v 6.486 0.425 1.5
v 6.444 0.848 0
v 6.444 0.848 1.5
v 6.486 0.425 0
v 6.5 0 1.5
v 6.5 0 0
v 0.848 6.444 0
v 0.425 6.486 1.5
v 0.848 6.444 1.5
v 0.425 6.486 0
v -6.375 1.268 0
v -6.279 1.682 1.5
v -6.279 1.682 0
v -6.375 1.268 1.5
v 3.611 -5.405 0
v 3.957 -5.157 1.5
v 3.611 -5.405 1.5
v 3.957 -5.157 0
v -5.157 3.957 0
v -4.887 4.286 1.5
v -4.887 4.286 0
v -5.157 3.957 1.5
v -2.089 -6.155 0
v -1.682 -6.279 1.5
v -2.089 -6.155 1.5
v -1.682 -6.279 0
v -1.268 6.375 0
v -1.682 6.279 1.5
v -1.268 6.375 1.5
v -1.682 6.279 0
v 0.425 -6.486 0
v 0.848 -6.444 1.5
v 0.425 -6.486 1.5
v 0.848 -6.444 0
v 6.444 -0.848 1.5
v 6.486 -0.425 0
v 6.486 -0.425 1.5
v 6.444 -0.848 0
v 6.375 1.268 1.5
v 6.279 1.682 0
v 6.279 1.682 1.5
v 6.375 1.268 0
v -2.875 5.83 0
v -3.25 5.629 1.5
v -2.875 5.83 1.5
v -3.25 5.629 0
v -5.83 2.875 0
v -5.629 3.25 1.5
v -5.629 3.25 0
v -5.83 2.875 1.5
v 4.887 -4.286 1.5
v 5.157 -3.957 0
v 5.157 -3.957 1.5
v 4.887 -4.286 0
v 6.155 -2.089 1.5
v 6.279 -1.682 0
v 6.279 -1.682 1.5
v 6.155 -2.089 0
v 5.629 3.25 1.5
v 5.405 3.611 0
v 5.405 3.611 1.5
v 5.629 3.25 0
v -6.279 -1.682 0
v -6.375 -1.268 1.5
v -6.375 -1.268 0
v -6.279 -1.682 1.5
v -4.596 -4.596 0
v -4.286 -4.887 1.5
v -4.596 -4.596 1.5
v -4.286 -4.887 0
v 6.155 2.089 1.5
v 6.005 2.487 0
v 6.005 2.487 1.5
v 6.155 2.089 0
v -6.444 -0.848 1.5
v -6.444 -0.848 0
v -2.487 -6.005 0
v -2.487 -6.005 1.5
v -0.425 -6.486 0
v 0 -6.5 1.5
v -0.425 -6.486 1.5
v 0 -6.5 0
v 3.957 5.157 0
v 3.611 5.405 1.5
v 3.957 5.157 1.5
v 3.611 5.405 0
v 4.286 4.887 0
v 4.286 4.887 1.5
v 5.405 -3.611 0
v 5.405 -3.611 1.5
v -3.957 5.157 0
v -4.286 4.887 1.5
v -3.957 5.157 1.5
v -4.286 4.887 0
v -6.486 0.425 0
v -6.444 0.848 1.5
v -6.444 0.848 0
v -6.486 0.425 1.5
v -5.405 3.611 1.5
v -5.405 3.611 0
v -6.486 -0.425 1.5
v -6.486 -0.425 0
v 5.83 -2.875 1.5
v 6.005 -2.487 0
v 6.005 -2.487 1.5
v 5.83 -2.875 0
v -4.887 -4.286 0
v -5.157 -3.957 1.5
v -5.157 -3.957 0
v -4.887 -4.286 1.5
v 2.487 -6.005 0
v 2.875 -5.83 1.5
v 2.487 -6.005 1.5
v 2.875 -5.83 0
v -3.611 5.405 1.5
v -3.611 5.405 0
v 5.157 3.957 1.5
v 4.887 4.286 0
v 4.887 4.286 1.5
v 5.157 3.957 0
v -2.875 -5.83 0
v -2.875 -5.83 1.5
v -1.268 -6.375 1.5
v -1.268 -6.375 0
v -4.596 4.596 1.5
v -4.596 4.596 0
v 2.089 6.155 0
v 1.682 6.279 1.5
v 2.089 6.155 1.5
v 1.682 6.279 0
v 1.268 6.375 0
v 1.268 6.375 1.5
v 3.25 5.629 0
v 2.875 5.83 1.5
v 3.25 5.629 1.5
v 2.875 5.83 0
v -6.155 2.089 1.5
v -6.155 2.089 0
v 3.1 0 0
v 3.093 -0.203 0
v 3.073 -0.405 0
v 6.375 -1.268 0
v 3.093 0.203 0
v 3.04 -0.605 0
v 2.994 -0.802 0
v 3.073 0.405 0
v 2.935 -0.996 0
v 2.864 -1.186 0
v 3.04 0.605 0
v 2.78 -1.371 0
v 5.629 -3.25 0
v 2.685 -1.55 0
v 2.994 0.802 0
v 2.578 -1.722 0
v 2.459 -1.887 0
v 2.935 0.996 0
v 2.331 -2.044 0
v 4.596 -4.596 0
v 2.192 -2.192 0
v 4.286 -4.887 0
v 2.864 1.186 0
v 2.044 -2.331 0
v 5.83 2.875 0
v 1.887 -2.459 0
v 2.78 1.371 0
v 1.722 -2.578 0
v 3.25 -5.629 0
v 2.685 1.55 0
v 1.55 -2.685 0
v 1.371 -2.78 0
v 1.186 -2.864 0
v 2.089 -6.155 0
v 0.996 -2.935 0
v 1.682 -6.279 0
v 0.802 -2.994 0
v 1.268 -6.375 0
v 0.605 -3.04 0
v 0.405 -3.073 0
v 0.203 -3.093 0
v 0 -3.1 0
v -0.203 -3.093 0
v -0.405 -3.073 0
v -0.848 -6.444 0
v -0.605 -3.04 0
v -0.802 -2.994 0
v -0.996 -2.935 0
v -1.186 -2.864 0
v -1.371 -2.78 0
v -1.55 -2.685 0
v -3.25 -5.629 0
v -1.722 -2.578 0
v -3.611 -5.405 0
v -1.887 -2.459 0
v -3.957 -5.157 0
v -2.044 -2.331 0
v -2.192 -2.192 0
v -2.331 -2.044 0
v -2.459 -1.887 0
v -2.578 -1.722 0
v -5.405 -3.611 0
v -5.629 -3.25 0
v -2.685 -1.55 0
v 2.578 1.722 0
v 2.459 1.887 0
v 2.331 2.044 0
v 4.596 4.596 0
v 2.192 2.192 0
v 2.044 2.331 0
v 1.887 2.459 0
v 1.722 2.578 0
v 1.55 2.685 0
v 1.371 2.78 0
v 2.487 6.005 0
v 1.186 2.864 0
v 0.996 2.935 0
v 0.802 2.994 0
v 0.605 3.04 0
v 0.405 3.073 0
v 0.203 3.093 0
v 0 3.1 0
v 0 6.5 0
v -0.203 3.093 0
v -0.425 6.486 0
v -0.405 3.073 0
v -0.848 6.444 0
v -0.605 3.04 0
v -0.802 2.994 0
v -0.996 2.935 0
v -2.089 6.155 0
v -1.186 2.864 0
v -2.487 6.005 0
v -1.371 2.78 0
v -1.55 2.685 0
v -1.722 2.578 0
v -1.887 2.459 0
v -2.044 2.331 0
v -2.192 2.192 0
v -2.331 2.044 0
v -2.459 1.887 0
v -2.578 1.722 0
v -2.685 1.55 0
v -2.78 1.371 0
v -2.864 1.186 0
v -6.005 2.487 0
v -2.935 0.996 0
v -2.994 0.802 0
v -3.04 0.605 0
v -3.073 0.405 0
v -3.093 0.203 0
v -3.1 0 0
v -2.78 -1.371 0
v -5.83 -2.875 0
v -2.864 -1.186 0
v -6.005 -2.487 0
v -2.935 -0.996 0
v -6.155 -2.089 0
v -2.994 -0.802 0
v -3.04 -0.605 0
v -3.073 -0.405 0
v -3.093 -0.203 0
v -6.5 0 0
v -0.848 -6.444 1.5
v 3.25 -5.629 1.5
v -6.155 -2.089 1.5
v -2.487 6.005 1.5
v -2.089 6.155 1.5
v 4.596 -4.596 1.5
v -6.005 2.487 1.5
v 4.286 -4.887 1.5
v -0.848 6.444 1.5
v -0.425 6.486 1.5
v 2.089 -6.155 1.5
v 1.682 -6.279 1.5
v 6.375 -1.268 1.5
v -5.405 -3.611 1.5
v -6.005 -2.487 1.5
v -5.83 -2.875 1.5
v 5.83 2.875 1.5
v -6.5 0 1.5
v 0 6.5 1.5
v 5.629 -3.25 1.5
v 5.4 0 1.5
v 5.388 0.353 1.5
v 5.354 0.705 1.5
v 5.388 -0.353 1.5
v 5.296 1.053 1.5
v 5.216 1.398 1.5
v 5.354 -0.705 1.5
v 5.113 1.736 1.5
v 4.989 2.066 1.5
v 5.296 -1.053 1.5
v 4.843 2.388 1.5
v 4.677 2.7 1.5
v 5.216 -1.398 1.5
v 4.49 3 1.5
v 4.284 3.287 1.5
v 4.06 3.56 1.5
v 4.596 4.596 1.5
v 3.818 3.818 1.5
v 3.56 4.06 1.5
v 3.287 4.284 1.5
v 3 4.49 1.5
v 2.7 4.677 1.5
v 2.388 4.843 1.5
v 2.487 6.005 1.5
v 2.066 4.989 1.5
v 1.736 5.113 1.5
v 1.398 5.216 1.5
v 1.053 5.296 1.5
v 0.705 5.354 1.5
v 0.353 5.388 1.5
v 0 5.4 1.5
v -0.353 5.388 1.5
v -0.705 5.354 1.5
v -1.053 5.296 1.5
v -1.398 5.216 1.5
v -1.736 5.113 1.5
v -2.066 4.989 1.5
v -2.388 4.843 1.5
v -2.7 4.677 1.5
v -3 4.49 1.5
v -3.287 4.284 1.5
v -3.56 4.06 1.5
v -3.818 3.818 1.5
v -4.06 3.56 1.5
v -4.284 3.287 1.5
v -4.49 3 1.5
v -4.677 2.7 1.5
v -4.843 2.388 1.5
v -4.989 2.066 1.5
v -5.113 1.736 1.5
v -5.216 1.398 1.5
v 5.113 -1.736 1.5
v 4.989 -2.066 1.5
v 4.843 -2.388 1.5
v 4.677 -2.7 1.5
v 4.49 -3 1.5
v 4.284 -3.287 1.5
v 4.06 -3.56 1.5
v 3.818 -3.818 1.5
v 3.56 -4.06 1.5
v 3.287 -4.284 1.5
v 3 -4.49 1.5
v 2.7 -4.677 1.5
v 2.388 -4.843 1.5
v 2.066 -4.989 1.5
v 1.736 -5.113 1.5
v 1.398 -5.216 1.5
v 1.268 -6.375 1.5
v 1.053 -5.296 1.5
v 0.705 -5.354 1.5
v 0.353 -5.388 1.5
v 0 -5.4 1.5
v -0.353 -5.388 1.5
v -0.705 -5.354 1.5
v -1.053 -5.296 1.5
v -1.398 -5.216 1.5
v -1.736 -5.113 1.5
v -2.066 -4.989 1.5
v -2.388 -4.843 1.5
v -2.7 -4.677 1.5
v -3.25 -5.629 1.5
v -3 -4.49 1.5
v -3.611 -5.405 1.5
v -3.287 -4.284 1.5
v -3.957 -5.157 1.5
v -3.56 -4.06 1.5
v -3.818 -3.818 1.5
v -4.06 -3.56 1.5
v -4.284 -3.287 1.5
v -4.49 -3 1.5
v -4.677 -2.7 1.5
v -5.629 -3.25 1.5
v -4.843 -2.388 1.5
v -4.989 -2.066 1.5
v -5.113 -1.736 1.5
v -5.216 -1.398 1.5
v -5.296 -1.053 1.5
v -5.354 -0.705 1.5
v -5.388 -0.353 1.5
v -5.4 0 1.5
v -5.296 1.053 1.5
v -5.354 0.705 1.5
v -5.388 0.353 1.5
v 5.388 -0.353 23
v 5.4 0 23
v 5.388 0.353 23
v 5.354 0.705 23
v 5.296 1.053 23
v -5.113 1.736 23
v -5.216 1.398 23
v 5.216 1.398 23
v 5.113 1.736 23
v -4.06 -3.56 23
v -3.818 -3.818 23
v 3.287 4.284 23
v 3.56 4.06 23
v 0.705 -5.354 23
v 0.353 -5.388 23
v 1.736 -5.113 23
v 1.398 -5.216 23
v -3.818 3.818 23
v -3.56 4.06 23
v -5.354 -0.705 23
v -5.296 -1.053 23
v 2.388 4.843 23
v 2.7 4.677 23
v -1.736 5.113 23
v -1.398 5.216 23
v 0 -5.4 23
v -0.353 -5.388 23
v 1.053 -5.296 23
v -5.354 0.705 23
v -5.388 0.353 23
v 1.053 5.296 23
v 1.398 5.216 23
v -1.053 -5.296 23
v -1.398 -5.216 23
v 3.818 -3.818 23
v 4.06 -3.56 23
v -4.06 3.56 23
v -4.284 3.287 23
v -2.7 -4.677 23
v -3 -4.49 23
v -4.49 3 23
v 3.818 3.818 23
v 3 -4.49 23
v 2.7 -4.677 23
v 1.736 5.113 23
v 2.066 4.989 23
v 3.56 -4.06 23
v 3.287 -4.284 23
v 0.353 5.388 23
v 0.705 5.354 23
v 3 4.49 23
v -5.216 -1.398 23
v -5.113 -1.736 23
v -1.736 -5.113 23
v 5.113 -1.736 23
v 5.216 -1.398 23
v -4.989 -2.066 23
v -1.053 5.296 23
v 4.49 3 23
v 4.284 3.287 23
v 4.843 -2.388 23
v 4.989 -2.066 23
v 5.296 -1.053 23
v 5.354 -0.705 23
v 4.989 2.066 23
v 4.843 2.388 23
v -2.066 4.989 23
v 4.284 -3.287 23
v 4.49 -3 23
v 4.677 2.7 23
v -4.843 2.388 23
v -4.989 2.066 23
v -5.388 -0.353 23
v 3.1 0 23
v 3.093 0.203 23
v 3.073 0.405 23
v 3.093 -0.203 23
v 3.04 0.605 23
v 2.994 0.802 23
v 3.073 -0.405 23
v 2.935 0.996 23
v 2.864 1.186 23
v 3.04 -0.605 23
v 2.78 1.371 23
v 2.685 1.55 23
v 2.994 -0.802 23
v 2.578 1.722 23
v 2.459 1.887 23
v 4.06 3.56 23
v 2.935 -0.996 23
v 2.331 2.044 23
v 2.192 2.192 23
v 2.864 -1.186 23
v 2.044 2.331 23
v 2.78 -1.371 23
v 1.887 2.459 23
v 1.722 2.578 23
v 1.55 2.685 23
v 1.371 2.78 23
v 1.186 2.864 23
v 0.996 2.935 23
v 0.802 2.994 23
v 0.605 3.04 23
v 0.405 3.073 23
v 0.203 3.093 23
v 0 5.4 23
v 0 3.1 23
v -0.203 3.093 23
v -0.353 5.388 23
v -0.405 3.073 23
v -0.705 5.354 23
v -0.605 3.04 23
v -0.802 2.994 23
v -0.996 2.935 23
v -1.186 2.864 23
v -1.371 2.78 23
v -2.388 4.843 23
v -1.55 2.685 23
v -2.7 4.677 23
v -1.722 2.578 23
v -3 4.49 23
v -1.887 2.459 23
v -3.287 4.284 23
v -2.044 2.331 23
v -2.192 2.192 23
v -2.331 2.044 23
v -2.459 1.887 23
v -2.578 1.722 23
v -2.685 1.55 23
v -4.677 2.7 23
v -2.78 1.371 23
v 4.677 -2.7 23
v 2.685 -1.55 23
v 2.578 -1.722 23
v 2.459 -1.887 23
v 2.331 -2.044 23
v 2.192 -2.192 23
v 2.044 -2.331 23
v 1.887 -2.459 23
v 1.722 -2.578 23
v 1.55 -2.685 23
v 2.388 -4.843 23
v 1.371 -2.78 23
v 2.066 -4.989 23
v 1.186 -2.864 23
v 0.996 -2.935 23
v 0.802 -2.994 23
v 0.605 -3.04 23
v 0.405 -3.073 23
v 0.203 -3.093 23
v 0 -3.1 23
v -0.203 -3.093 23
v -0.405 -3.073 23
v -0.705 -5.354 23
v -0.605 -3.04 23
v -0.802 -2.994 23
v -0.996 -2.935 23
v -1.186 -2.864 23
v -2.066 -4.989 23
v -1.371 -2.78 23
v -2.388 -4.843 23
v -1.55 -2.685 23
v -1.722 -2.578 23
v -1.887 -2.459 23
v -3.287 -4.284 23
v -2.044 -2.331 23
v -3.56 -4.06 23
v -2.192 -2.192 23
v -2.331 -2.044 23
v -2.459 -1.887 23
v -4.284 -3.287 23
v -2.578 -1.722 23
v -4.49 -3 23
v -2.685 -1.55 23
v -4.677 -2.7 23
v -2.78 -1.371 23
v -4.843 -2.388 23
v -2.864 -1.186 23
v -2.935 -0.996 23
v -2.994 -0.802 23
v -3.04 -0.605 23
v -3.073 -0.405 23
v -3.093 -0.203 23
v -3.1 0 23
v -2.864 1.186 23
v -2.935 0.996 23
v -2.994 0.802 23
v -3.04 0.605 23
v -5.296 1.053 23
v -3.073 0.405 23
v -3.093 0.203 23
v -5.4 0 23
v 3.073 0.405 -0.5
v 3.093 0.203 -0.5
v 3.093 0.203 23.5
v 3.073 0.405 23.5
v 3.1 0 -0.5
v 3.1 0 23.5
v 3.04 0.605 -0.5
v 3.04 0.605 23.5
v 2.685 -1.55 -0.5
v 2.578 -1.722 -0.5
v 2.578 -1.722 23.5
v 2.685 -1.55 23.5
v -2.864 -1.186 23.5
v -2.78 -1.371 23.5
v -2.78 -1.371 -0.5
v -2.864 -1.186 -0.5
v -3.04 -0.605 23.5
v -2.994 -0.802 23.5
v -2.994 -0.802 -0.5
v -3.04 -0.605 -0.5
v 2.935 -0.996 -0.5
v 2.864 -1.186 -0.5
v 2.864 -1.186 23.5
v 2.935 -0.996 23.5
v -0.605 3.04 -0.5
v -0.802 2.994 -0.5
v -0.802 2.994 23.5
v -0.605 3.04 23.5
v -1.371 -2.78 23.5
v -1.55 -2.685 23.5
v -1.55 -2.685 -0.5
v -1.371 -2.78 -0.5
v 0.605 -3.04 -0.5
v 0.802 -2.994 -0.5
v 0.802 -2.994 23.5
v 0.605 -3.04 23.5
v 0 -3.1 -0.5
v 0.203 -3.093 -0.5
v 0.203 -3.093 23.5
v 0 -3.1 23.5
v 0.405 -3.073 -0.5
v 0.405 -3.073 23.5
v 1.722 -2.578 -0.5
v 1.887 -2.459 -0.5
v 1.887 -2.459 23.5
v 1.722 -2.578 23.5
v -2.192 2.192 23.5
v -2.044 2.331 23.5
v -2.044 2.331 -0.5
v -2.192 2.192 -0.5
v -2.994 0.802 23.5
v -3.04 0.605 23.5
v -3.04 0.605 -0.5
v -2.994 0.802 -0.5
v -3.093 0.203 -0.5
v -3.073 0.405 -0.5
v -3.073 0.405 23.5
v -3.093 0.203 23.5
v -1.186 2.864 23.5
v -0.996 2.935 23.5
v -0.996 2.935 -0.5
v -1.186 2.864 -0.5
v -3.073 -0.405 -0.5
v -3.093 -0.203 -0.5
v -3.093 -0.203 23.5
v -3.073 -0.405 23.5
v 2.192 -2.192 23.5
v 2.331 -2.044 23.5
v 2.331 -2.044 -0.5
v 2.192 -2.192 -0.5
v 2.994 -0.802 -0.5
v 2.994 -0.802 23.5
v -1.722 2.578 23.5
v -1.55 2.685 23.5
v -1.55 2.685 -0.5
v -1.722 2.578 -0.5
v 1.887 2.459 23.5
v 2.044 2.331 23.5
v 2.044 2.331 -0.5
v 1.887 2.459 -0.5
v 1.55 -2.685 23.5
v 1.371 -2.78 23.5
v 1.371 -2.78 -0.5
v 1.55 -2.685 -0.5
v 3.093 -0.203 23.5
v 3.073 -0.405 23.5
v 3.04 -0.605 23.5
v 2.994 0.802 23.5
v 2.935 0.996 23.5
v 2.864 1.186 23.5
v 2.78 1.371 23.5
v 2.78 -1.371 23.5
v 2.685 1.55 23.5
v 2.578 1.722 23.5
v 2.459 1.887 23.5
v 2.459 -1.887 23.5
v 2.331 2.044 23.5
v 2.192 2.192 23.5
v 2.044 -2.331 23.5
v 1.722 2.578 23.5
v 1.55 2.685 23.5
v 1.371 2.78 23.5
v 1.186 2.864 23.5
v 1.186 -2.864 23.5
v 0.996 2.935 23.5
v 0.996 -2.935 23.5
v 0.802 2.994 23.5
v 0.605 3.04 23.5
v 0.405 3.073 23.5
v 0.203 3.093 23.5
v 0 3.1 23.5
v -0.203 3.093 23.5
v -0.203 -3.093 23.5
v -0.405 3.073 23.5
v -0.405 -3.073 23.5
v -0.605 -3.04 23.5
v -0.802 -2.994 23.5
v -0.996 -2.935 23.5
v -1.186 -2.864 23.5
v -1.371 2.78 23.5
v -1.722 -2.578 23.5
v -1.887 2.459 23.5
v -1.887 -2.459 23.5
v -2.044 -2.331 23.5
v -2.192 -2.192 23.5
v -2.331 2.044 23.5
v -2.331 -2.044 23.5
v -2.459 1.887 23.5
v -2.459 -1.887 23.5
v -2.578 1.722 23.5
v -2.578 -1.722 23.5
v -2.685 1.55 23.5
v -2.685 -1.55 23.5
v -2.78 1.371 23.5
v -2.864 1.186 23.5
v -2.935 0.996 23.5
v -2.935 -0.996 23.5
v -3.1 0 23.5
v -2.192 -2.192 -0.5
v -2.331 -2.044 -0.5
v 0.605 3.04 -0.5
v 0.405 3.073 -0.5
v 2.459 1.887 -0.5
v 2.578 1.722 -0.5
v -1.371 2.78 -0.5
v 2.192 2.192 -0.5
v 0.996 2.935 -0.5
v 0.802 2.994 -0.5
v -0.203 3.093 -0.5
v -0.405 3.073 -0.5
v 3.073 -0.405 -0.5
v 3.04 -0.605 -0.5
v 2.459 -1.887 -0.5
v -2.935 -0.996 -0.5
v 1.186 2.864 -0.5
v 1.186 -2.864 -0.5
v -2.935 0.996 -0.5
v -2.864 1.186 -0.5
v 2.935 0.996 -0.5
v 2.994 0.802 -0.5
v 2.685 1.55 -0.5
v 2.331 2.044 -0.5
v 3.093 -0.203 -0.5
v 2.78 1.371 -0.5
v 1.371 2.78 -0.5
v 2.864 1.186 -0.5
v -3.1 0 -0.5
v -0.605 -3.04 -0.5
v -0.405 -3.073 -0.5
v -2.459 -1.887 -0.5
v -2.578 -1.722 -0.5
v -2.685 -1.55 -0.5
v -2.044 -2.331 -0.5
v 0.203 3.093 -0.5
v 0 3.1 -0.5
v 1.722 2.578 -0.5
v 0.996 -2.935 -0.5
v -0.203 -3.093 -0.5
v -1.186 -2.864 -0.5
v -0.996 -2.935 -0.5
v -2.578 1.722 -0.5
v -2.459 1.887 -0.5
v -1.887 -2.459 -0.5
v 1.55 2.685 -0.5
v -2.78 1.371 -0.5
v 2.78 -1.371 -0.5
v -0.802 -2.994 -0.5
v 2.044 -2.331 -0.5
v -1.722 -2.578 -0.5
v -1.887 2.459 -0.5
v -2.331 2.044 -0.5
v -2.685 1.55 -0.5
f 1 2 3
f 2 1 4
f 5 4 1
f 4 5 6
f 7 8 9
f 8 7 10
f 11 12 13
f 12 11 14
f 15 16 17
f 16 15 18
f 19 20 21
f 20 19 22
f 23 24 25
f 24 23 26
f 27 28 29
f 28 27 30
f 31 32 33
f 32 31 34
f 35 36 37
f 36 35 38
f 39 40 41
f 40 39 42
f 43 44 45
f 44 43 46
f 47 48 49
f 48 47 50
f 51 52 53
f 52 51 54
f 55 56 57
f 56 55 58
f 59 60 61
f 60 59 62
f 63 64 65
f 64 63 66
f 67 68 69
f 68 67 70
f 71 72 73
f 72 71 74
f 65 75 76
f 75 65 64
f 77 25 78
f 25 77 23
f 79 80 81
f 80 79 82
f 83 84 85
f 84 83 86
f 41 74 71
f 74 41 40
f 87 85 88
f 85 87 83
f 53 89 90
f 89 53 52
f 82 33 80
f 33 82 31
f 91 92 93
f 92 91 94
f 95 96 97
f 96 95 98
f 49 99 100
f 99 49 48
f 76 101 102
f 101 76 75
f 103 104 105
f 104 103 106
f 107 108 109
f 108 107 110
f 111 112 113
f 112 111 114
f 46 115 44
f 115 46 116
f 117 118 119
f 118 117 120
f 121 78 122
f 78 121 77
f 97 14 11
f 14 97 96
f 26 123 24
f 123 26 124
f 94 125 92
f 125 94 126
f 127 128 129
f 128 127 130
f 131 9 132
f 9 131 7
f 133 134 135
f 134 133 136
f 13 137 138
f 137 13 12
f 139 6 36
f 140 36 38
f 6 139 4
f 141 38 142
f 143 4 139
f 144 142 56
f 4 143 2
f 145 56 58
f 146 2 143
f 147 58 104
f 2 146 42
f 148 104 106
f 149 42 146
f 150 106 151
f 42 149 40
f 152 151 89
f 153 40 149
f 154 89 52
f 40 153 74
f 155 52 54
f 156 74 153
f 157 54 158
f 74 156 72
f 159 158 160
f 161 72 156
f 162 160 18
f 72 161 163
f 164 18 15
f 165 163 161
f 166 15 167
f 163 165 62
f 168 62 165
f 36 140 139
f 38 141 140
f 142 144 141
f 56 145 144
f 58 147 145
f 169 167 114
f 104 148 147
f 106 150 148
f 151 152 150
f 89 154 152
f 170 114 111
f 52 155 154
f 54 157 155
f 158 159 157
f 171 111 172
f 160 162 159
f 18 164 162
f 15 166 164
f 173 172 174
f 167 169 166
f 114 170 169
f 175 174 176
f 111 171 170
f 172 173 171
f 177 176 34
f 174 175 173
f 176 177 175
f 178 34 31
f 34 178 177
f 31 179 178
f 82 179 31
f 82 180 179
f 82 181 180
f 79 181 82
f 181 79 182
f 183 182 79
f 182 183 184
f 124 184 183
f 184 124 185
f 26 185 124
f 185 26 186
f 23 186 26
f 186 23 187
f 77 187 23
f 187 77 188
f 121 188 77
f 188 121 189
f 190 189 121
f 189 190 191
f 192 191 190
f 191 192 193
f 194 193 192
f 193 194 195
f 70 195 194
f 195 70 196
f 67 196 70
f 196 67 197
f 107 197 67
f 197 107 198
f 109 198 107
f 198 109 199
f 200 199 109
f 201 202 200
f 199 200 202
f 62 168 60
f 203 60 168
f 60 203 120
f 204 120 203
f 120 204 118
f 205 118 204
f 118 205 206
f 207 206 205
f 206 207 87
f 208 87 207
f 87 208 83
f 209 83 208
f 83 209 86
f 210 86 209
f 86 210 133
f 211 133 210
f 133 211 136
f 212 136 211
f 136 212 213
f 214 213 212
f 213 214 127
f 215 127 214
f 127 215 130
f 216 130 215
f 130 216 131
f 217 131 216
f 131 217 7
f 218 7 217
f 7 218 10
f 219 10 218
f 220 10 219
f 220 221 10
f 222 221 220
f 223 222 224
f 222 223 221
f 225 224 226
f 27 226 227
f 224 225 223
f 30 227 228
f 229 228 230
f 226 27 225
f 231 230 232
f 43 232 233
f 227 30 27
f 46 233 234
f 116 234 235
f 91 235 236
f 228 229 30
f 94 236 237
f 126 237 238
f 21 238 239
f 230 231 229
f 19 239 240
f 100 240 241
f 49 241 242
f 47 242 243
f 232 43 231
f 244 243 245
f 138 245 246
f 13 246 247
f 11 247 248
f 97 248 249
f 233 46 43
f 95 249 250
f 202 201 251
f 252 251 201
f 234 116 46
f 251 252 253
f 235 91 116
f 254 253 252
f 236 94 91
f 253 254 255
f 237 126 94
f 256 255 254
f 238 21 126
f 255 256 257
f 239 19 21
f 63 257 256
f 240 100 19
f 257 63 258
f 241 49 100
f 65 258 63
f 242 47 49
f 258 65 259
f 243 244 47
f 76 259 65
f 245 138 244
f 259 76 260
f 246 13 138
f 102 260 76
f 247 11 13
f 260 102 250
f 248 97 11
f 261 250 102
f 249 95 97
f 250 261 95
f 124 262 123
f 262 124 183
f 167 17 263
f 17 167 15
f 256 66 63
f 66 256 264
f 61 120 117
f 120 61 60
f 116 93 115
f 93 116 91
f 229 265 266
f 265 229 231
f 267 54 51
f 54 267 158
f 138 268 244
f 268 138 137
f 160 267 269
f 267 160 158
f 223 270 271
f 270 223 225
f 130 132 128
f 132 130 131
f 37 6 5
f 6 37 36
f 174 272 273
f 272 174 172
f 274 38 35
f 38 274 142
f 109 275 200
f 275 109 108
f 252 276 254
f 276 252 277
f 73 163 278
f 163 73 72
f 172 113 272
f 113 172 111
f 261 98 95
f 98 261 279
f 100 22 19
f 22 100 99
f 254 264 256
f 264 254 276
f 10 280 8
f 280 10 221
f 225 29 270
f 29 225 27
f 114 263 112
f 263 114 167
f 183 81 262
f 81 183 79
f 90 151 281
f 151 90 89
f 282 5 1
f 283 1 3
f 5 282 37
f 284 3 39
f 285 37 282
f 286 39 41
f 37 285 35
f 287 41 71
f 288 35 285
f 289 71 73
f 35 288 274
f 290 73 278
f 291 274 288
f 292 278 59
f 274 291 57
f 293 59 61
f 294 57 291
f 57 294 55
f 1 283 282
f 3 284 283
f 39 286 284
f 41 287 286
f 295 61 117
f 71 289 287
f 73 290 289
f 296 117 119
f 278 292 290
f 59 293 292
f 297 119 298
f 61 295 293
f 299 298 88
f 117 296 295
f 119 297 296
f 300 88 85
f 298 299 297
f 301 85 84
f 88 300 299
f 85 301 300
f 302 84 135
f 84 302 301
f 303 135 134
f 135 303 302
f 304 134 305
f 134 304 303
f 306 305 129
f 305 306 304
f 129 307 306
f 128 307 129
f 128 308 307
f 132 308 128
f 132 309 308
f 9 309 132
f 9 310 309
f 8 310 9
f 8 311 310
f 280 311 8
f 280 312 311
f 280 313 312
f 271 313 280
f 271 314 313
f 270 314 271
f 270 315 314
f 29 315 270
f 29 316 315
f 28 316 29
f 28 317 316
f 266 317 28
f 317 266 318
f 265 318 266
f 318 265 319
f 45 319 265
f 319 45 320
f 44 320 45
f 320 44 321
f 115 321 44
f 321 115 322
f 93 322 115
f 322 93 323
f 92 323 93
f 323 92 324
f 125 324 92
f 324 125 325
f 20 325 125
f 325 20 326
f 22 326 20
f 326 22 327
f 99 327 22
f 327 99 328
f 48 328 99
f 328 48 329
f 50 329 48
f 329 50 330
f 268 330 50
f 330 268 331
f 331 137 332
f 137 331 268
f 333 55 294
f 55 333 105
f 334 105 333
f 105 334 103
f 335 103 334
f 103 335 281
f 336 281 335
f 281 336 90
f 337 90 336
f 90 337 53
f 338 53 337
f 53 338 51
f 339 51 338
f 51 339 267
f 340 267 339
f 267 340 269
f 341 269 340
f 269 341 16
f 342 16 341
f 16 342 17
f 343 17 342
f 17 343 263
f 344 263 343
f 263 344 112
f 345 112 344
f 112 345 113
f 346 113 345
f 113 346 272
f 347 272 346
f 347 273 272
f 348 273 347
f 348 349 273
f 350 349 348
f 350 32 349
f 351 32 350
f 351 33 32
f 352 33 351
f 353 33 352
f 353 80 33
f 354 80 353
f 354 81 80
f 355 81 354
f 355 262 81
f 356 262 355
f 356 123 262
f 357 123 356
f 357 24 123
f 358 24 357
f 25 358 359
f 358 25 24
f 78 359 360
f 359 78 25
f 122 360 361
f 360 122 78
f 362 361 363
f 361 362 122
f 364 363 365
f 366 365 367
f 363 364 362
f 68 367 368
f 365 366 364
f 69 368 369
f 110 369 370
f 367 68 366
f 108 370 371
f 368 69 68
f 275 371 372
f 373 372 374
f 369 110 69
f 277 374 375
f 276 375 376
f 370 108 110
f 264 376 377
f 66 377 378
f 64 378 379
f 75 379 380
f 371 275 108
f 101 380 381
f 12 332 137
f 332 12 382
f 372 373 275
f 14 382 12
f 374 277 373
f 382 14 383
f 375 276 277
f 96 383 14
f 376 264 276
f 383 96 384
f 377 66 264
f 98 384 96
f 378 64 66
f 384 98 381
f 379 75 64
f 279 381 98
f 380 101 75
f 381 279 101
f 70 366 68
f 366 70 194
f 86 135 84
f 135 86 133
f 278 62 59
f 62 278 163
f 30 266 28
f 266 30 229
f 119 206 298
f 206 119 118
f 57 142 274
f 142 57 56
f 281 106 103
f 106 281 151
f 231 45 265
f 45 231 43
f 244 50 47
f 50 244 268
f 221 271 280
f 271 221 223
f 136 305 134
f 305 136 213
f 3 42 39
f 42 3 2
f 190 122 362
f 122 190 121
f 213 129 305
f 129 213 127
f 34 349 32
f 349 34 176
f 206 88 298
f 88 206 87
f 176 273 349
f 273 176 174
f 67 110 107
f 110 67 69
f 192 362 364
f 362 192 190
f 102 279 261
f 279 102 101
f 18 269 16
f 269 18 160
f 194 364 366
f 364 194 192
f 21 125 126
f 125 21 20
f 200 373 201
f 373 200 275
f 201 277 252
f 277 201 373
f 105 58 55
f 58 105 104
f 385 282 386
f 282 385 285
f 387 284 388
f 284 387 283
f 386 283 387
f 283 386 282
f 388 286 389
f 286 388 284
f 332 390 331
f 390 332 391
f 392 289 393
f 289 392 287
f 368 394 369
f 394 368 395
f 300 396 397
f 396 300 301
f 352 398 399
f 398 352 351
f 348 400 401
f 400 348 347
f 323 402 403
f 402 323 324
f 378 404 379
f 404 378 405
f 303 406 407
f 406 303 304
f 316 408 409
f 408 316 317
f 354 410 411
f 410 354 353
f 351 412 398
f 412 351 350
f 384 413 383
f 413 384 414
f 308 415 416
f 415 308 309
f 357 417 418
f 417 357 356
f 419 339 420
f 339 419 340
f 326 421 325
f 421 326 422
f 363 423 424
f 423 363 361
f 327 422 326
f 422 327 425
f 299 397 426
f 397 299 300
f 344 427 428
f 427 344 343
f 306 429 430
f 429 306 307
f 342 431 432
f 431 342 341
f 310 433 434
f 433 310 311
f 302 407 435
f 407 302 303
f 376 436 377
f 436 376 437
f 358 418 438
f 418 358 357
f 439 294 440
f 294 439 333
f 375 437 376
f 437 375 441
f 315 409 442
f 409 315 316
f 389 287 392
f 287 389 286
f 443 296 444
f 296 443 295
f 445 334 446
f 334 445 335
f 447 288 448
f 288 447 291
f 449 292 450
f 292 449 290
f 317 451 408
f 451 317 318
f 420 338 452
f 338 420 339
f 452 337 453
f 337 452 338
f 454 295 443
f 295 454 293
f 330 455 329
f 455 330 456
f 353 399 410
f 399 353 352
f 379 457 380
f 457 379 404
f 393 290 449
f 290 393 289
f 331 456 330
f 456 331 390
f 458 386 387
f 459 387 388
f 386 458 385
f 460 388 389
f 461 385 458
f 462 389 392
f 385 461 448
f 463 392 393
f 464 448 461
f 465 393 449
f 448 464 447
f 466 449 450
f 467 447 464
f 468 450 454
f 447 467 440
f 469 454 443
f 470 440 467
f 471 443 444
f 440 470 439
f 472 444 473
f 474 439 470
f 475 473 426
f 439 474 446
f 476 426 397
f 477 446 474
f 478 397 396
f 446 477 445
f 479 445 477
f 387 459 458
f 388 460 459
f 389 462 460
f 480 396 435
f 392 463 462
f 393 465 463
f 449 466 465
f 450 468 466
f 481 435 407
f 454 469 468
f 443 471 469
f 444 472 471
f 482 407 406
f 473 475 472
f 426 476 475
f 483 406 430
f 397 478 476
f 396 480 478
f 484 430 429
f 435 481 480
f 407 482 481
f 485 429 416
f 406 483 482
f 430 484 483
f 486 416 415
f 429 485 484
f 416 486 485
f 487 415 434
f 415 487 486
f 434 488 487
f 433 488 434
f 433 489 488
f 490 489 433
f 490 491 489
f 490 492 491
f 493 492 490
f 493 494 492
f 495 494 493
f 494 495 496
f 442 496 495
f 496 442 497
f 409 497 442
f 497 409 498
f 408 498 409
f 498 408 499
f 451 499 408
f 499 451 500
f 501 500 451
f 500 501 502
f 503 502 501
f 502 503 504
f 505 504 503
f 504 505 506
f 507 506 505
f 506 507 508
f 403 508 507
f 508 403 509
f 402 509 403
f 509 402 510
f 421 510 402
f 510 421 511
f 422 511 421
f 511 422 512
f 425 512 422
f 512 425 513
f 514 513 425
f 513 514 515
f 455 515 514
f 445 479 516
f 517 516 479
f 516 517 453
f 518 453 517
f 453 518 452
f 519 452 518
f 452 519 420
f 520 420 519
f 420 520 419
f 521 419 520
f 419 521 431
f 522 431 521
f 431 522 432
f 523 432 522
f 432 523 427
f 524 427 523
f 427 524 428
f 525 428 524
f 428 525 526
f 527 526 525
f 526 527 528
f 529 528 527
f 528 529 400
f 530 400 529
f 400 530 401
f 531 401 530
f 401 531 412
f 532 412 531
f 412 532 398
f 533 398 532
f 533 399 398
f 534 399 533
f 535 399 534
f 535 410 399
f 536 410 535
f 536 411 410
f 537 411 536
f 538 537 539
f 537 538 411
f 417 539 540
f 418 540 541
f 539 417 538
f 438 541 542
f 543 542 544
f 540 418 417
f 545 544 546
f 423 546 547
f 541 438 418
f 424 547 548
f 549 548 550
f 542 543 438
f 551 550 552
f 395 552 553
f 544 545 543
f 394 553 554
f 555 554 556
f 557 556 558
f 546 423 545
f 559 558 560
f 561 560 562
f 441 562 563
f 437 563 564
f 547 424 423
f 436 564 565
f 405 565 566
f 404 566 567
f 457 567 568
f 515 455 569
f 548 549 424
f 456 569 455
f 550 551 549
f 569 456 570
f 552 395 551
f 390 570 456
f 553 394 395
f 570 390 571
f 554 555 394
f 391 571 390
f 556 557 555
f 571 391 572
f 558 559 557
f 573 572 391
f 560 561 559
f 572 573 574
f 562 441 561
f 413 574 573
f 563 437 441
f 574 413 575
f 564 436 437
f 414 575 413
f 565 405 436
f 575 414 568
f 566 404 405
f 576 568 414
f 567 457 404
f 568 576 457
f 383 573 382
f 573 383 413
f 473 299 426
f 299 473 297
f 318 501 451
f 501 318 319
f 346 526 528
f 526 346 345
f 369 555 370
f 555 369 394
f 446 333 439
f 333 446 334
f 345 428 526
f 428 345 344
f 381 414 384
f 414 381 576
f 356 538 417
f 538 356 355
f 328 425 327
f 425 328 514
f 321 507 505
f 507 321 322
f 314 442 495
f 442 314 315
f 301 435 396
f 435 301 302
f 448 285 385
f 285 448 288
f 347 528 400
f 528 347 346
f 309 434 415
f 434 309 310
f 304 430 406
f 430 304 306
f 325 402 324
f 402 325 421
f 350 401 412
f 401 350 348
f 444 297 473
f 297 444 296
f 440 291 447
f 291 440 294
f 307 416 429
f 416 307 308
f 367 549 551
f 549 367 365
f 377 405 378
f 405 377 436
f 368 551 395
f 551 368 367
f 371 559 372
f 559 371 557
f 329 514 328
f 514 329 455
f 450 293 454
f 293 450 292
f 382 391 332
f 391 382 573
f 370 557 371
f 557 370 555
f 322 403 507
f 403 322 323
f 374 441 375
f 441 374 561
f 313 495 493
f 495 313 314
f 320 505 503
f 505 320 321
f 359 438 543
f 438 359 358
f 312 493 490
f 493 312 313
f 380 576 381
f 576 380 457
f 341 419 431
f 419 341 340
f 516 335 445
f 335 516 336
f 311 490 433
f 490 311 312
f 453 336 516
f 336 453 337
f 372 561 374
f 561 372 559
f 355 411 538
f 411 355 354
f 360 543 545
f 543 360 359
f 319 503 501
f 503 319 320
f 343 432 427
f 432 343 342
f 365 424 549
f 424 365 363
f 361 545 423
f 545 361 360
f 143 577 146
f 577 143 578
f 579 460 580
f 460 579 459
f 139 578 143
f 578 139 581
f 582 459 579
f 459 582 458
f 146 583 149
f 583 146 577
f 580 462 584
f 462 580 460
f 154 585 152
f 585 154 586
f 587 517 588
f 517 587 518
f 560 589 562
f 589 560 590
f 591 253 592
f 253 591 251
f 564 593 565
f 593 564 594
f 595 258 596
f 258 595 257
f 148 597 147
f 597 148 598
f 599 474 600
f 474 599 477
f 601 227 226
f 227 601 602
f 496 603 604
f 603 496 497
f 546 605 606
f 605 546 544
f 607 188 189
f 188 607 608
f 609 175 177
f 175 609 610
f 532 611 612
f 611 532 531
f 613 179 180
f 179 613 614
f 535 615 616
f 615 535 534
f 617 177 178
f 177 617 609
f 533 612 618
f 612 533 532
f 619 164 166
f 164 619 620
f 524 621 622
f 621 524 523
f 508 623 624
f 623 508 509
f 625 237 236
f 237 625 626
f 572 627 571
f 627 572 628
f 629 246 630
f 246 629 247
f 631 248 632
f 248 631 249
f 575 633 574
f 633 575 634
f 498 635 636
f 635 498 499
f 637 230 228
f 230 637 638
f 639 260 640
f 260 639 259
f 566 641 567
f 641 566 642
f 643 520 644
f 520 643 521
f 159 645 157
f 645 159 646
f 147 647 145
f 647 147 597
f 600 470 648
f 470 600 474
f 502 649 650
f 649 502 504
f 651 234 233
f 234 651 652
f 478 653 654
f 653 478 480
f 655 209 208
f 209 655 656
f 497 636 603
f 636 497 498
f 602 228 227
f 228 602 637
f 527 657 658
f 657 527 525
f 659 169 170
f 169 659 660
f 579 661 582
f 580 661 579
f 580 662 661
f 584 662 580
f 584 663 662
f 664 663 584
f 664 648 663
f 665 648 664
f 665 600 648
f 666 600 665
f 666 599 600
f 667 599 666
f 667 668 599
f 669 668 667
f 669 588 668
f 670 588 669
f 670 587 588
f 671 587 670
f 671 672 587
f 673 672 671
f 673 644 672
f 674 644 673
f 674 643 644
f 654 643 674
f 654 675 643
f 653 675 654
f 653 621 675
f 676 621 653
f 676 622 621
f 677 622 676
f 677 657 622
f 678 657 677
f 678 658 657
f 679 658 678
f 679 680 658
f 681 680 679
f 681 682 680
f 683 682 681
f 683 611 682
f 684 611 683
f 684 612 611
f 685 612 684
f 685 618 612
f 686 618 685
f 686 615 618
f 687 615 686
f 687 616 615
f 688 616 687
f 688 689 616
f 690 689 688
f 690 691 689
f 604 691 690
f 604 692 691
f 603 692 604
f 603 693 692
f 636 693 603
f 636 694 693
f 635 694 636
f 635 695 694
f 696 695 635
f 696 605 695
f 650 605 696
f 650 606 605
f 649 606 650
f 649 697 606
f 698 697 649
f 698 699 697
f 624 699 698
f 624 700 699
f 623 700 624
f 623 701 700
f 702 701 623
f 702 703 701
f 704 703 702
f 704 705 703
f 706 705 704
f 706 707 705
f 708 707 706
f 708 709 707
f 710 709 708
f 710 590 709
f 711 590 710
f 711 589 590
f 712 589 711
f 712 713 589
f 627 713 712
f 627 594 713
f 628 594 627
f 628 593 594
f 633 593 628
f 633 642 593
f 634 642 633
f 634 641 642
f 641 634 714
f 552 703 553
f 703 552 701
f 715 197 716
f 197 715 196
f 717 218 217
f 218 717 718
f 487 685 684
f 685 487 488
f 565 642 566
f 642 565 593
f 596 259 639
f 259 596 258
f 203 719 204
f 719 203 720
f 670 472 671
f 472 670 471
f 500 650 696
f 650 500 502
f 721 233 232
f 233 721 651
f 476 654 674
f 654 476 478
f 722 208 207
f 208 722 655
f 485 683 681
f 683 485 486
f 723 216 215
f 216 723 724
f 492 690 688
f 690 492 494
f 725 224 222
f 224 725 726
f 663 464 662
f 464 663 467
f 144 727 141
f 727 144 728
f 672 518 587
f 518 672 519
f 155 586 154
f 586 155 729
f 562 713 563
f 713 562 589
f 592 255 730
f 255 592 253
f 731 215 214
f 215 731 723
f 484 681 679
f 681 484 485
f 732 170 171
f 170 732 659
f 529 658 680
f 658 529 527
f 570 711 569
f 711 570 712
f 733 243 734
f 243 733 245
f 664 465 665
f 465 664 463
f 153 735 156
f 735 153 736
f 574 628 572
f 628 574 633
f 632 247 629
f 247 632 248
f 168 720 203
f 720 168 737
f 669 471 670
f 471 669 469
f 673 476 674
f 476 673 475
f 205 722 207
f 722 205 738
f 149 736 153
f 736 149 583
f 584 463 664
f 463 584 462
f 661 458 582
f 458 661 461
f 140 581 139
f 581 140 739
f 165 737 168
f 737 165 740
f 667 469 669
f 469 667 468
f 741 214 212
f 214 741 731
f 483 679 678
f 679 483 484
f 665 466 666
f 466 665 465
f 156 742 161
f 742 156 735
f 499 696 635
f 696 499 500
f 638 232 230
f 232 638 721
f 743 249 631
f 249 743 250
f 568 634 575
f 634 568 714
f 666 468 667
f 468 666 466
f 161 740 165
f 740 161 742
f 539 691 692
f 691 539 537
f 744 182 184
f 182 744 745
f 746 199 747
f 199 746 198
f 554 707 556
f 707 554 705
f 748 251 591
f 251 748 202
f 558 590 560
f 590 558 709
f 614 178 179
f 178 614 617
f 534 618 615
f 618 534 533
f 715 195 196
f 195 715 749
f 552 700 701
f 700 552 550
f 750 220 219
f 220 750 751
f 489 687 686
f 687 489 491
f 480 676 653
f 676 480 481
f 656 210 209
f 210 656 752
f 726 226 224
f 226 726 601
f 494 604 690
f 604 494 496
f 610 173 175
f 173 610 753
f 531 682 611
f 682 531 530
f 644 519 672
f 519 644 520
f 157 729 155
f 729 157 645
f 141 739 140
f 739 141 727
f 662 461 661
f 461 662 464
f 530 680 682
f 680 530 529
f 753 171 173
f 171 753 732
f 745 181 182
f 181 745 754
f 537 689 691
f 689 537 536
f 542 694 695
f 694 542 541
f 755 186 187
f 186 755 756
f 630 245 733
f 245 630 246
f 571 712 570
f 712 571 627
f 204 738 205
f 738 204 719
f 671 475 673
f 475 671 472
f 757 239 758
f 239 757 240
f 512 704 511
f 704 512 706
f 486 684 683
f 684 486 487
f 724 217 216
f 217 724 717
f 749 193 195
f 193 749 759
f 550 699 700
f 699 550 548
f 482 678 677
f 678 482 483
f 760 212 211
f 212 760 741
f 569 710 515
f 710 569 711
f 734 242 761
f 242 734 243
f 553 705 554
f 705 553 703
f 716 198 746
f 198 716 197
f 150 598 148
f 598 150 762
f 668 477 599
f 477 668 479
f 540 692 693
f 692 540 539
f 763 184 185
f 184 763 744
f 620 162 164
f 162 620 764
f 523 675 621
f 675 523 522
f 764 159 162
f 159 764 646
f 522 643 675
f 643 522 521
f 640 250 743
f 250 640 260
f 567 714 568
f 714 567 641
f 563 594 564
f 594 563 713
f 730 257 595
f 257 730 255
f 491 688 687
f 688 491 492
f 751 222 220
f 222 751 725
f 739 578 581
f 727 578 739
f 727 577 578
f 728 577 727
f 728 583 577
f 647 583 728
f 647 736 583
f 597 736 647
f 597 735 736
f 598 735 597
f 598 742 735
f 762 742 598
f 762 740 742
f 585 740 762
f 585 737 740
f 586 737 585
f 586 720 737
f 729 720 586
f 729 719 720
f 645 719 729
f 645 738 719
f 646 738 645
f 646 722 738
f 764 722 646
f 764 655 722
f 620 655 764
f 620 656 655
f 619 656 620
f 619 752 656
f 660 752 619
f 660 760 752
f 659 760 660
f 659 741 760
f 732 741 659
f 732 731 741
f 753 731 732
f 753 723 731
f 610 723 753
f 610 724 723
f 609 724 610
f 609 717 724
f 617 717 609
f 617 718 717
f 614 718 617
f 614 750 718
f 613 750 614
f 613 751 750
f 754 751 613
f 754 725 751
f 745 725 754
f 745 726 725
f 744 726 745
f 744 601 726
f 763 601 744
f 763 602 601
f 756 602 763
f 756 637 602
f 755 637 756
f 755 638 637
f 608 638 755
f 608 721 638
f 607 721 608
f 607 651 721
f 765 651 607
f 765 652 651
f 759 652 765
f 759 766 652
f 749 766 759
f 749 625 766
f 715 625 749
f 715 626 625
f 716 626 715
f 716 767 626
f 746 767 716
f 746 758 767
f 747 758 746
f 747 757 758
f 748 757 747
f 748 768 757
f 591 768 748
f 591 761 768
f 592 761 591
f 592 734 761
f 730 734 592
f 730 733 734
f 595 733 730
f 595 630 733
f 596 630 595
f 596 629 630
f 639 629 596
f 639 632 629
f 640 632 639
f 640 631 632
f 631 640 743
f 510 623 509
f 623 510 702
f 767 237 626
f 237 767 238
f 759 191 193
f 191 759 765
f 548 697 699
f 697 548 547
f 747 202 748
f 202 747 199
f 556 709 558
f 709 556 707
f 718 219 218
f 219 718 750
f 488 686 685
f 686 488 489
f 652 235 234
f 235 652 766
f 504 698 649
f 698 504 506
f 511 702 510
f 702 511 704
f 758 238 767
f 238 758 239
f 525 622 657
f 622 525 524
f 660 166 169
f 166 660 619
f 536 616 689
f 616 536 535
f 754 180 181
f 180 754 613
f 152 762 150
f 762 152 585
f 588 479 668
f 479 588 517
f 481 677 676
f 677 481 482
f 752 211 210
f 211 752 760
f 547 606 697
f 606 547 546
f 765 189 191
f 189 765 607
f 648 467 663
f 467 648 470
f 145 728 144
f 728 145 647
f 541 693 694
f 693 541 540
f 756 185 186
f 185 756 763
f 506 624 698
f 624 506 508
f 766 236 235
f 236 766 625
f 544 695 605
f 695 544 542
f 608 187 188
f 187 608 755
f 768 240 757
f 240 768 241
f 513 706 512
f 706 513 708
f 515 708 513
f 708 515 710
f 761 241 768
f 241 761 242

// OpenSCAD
// PCR tube adapter sleeve - prints upside down: collar on bed, sleeve body rises up
// Units: mm

// ---- Dimensions ----
collar_d        = 13;     // collar outer diameter
collar_t        = 1.5;    // collar thickness (z = 0 to 1.5)
sleeve_od       = 10.8;   // sleeve body outer diameter
sleeve_h        = 21.5;   // sleeve body height above collar (z = 1.5 to 23)
bore_d          = 6.2;    // straight through-bore diameter
eps             = 0.5;    // cutter overshoot past faces

$fn = 96;

// ---- Model ----
union() {
    // Collar lying on the bed
    cylinder(d = collar_d, h = collar_t);

    // Sleeve body rising from the collar
    translate([0, 0, collar_t])
        cylinder(d = sleeve_od, h = sleeve_h);
}

// Full-height bore, open at both ends
translate([0, 0, -eps])
    cylinder(d = bore_d, h = sleeve_h + collar_t + 2 * eps);
